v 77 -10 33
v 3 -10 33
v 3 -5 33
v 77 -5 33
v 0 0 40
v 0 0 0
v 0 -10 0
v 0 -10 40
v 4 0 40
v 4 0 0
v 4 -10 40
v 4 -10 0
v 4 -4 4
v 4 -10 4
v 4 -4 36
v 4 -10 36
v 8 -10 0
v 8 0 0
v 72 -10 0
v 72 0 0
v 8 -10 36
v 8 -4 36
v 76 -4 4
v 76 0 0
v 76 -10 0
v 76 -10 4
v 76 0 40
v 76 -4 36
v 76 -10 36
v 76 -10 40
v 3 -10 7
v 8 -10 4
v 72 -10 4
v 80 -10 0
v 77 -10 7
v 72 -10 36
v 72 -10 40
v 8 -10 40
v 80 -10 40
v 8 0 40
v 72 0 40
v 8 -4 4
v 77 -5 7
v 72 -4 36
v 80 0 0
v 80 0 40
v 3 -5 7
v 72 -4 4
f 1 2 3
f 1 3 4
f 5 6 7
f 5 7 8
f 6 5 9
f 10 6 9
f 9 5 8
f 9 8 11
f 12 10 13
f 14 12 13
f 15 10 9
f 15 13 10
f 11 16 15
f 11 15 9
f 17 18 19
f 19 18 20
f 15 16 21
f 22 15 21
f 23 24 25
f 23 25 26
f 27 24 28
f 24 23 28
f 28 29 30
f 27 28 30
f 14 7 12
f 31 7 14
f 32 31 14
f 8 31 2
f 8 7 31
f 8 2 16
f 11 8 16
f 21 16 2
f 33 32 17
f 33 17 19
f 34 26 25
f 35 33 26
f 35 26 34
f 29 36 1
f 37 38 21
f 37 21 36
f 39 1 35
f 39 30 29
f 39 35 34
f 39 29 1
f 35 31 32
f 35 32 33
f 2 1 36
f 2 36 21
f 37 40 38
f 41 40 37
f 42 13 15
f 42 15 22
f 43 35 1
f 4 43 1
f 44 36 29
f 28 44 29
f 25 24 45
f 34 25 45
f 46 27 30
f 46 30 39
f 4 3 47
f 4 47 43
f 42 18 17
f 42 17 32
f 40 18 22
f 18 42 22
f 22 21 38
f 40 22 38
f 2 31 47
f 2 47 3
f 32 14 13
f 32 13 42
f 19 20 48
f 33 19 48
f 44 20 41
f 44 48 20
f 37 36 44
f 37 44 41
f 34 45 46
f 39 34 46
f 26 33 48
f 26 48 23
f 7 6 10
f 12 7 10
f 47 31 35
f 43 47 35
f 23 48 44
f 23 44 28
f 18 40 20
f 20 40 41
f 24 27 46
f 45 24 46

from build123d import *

# Parameters (mm, degrees)
F0_W     = 80
F0_H     = 40
F1_DEPTH = 10
F2_W     = 74
F2_H     = 26
F3_DEPTH = 5
F4_W     = 4
F4_H     = 4
F5_DEPTH = 25.4
F6_W     = 4
F6_H     = 4
F7_DEPTH = 50.8


with BuildPart() as f1:
    # F0 (on Front) → F1 (new body)
    with BuildSketch(Plane.XZ):
        with Locations((40, 20)):
            Rectangle(F0_W, F0_H)
    extrude(amount=F1_DEPTH)

    # F2 (on face) → F3 (cut)
    with BuildSketch(Plane.XZ.offset(10)):
        with Locations((40, 20)):
            Rectangle(F2_W, F2_H)
    extrude(amount=-F3_DEPTH, mode=Mode.SUBTRACT)

    # F4 (on face) → F5 (cut)
    with BuildSketch(Plane.XZ.offset(10)):
        with Locations((6, 38)):
            Rectangle(F4_W, F4_H)
        with Locations((74, 38)):
            Rectangle(F4_W, F4_H)
        with Locations((74, 2)):
            Rectangle(F4_W, F4_H)
        with Locations((6, 2)):
            Rectangle(F4_W, F4_H)
    extrude(amount=-F5_DEPTH, mode=Mode.SUBTRACT)

    # F6 (on face) → F7 (cut)
    with BuildSketch(Plane.XY.offset(40)):
        with Locations((6, -2)):
            Rectangle(F6_W, F6_H)
        with Locations((74, -2)):
            Rectangle(F6_W, F6_H)
    extrude(amount=-F7_DEPTH, mode=Mode.SUBTRACT)


solid = f1.part
